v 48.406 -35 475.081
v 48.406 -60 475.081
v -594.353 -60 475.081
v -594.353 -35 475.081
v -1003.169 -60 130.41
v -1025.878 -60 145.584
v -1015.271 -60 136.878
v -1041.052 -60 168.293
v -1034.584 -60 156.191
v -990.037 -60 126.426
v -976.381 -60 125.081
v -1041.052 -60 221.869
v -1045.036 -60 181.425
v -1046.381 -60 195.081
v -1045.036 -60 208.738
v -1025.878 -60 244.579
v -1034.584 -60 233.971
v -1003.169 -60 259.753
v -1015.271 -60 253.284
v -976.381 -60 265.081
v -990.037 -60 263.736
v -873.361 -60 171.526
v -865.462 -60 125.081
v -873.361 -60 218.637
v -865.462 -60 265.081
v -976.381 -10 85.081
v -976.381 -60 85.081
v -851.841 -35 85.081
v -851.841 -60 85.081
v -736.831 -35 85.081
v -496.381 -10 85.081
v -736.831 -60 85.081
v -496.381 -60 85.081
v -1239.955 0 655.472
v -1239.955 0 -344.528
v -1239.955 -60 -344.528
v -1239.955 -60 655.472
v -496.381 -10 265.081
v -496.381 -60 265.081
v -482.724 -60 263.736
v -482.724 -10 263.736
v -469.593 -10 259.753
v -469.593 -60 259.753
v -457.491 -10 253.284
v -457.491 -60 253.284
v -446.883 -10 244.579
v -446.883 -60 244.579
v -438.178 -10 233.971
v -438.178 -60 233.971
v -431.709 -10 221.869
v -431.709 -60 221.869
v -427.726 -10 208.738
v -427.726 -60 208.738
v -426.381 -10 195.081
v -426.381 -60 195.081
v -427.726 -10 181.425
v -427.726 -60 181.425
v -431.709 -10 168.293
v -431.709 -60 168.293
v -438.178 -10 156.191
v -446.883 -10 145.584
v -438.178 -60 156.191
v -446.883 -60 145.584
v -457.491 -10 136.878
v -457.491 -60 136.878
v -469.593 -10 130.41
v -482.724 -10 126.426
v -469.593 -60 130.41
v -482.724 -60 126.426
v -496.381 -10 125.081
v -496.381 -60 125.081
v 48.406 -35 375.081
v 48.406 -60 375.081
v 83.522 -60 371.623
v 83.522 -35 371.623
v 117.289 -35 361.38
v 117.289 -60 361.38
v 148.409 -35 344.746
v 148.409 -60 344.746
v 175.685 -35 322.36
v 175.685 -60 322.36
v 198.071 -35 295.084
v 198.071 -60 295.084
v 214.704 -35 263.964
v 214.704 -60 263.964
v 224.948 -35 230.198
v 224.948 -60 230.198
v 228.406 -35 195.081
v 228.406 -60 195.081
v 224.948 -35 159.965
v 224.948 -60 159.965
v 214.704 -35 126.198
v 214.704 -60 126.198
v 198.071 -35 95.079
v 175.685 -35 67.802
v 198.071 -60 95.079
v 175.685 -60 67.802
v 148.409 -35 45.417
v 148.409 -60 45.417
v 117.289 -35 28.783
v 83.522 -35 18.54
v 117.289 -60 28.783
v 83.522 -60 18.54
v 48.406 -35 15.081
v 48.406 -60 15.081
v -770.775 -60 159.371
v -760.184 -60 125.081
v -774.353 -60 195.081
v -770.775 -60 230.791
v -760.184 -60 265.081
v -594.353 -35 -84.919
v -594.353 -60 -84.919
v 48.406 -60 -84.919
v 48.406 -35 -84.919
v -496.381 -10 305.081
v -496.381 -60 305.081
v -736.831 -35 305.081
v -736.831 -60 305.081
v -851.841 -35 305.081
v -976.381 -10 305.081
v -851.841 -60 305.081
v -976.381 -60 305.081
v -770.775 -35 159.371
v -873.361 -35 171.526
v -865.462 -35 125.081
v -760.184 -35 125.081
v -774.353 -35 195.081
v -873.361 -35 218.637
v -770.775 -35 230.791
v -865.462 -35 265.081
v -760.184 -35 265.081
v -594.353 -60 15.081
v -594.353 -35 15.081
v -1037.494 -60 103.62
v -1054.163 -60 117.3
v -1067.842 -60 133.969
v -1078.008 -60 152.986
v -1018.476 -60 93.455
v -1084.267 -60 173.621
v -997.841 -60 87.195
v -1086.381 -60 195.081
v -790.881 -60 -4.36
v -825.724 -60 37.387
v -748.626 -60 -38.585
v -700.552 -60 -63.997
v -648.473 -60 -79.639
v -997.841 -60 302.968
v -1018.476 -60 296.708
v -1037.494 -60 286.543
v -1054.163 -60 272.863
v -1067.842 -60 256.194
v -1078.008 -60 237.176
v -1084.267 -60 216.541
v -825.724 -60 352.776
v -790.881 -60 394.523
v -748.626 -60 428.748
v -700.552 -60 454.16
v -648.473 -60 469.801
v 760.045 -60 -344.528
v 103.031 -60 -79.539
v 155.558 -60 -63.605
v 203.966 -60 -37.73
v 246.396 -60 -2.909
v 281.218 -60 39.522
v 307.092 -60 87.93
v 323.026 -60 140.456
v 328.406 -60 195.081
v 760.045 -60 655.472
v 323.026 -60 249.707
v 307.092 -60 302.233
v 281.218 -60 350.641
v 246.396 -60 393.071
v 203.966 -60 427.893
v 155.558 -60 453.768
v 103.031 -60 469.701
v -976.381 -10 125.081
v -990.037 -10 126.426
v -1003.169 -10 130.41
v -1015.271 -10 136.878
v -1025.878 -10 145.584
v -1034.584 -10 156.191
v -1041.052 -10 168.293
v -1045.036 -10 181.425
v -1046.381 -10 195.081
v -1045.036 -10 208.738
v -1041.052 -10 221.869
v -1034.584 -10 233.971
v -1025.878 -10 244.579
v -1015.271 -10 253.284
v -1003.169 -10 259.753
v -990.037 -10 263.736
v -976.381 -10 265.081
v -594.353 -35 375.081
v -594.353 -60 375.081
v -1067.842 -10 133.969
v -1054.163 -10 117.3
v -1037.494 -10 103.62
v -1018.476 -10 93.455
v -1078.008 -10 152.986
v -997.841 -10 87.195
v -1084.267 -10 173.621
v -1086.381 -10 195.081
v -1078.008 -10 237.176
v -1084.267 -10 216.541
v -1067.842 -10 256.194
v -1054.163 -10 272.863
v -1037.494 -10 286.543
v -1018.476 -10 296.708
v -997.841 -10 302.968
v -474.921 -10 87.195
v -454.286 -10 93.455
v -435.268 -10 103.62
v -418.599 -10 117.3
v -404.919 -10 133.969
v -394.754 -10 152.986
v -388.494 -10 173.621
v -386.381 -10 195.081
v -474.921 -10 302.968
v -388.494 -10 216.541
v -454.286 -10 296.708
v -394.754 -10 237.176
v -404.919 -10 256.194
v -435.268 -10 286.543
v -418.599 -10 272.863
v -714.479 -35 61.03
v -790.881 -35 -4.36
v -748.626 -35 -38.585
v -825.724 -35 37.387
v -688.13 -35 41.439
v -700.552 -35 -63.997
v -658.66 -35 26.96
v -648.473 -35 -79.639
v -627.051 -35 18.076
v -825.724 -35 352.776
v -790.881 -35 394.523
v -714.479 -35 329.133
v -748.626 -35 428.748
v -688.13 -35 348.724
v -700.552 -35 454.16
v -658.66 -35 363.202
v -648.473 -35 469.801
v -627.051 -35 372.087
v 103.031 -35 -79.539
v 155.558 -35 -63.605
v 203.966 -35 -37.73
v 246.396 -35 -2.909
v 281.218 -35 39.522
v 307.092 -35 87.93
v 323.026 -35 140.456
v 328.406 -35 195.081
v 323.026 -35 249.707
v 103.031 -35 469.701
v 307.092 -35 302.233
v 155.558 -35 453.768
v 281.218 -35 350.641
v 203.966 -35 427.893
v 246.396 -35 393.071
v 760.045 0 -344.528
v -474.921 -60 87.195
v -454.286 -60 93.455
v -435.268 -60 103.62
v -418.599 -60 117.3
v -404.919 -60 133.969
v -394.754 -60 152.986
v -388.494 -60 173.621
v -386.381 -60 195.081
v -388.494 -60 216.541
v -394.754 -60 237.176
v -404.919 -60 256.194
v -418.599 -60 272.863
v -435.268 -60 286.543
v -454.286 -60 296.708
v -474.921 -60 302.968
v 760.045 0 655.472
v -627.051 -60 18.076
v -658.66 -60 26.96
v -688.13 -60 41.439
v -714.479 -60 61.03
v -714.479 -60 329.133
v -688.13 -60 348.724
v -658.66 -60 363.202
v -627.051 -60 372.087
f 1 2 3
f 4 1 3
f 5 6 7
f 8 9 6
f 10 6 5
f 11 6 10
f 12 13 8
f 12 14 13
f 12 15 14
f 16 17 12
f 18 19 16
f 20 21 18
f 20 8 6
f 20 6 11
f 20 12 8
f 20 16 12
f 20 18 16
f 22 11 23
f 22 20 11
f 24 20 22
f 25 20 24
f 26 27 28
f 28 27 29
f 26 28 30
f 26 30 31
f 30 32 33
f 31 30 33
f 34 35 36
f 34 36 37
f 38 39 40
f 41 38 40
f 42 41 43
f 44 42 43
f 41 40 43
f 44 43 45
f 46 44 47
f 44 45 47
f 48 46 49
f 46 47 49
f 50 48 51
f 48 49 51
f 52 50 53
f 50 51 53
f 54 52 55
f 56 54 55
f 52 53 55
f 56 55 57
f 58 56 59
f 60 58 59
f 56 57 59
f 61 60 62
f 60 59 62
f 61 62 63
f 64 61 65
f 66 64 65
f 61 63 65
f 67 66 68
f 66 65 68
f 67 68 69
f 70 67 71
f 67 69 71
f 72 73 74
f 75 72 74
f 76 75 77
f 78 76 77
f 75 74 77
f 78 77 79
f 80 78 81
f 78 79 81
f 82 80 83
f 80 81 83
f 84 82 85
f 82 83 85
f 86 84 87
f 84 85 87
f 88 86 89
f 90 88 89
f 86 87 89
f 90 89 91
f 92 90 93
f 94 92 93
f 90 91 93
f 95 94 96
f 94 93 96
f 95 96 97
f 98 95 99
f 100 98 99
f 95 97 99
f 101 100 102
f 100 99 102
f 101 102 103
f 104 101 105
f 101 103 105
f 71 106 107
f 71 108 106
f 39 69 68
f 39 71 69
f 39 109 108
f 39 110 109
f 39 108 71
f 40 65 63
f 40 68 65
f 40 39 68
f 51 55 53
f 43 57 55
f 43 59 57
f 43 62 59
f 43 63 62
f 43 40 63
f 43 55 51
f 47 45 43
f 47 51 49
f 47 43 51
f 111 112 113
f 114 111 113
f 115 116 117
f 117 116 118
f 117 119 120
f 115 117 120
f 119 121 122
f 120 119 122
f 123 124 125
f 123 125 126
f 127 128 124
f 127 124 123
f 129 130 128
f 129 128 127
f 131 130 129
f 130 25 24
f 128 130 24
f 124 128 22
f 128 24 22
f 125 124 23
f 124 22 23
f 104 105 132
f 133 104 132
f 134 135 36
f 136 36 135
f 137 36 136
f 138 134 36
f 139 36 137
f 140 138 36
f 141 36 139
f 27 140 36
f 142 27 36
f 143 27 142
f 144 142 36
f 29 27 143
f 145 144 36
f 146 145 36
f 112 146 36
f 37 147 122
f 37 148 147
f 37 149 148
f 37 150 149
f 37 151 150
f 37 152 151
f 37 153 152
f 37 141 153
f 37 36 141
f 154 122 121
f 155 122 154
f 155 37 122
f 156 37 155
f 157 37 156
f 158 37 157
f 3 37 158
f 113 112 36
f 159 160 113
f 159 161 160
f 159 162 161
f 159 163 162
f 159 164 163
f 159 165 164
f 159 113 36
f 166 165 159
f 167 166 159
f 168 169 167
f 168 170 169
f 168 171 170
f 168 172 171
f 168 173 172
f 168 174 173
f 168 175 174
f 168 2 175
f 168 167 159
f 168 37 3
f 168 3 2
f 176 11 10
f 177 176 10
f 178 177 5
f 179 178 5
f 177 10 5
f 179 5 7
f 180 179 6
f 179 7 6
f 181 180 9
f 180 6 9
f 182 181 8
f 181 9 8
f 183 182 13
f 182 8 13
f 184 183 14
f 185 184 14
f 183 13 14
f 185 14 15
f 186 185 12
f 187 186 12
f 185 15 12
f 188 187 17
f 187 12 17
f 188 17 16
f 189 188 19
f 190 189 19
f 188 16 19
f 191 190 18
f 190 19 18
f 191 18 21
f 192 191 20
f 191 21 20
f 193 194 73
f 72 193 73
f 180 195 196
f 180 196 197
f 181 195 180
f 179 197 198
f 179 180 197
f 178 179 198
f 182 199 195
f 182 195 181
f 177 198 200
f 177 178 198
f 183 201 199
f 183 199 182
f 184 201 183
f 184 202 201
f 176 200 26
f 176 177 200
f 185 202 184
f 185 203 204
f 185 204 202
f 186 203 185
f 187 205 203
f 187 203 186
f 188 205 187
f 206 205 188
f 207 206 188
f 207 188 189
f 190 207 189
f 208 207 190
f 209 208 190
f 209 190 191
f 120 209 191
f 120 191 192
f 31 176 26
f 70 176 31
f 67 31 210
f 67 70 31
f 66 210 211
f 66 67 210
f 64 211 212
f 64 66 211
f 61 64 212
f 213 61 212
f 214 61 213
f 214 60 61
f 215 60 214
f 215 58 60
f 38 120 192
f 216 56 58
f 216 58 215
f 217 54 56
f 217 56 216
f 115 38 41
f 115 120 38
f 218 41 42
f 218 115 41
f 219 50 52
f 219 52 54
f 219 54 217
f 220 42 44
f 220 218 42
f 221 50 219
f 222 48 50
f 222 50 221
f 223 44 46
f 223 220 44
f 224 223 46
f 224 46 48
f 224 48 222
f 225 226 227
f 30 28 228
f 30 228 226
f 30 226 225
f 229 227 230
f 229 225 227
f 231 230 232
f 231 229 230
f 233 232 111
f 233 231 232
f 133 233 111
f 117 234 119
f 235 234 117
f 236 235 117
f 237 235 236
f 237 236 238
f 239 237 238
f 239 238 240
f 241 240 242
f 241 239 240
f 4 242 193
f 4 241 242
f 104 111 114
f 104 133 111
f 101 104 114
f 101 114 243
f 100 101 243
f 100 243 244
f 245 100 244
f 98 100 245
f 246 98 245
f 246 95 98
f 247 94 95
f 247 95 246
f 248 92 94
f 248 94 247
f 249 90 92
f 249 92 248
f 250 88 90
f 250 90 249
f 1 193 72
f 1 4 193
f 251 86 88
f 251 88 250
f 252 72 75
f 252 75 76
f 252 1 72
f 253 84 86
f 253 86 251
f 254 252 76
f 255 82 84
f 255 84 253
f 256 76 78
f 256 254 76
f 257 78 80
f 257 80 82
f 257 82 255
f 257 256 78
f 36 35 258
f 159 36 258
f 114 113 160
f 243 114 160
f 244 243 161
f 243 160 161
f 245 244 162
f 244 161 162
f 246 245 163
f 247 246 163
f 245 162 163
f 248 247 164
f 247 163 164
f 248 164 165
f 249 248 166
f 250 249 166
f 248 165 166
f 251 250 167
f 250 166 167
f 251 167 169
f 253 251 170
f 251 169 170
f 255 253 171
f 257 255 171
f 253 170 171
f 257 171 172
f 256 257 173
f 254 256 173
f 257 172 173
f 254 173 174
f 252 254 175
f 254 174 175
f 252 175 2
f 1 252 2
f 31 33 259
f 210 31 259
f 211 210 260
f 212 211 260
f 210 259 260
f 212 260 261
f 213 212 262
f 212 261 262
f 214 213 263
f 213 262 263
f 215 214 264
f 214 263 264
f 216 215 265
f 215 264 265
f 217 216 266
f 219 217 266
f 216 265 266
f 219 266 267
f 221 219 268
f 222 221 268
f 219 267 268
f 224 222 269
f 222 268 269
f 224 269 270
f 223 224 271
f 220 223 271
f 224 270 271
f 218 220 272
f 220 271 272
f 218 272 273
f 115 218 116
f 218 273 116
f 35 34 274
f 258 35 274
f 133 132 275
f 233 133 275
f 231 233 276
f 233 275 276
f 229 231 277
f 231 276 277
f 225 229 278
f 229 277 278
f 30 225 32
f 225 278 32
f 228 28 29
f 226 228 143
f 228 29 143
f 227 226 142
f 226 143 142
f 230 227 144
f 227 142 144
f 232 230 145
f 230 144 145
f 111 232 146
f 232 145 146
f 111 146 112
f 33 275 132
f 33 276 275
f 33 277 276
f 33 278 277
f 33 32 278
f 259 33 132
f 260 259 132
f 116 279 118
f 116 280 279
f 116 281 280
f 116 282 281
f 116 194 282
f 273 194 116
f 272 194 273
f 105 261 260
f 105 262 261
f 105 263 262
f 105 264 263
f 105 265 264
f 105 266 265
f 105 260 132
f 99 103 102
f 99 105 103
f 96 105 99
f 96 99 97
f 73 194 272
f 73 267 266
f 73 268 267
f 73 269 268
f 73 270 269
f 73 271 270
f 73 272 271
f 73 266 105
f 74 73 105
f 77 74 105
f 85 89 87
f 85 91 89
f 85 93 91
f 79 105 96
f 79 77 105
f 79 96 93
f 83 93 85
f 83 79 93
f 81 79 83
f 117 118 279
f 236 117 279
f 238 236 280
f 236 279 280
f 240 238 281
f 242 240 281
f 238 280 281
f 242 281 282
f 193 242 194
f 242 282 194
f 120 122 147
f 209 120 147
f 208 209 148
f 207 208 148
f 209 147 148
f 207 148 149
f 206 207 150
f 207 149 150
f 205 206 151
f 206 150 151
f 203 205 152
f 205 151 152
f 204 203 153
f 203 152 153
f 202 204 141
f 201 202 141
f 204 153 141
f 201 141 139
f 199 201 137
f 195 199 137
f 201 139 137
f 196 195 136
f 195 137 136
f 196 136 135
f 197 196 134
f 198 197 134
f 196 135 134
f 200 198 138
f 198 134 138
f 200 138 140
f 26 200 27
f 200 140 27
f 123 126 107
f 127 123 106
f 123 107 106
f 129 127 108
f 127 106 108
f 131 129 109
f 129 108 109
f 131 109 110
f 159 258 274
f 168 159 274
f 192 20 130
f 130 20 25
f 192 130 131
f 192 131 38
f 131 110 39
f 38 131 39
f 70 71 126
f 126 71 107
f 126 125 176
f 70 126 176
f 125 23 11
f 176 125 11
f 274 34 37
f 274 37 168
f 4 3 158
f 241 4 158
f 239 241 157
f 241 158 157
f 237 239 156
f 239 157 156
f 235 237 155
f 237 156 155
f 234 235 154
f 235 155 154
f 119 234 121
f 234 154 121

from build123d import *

# Parameters (mm, degrees)
F0_W     = 2000
F0_H     = 1000
F1_DEPTH = 60
F3_DEPTH = 50
F5_DEPTH = 25


with BuildPart() as f1:
    # F0 (on Front) → F1 (new body)
    with BuildSketch(Plane.XZ):
        with Locations((-239.9550452828, 155.4724135878)):
            Rectangle(F0_W, F0_H)
    extrude(amount=F1_DEPTH)

    # F2 (on face) → F3 (cut)
    with BuildSketch(Plane.XZ.offset(60)):
        with BuildLine():
            Line((-496.3808069078, 305.0812527983), (-976.3808069078, 305.0812527983))
            ThreePointArc((-976.3808069078, 305.0812527983), (-1086.3808069078, 195.0812527983), (-976.3808069078, 85.0812527983))
            Line((-976.3808069078, 85.0812527983), (-496.3808069078, 85.0812527983))
            ThreePointArc((-496.3808069078, 85.0812527983), (-386.3808069078, 195.0812527983), (-496.3808069078, 305.0812527983))
        make_face()
        with BuildLine():
            ThreePointArc((-976.3808069078, 125.0812527983), (-1046.3808069078, 195.0812527983), (-976.3808069078, 265.0812527983))
            Line((-976.3808069078, 265.0812527983), (-496.3808069078, 265.0812527983))
            ThreePointArc((-496.3808069078, 265.0812527983), (-426.3808069078, 195.0812527983), (-496.3808069078, 125.0812527983))
            Line((-496.3808069078, 125.0812527983), (-976.3808069078, 125.0812527983))
        make_face(mode=Mode.SUBTRACT)
    extrude(amount=-F3_DEPTH, mode=Mode.SUBTRACT)

    # F4 (on face) → F5 (cut)
    with BuildSketch(Plane.XZ.offset(60)):
        with BuildLine():
            ThreePointArc((-736.8312674929, 305.0812527983), (-673.7257383371, 356.6361970123), (-594.3531990051, 375.0812527983))
            Line((-594.3531990051, 375.0812527983), (48.4061799943, 375.0812527983))
            ThreePointArc((48.4061799943, 375.0812527983), (228.4061799943, 195.0812527983), (48.4061799943, 15.0812527983))
            Line((48.4061799943, 15.0812527983), (-594.3531990051, 15.0812527983))
            ThreePointArc((-594.3531990051, 15.0812527983), (-673.7257383371, 33.5263085842), (-736.8312674929, 85.0812527983))
            Line((-736.8312674929, 85.0812527983), (-851.8410627968, 85.0812527983))
            ThreePointArc((-851.8410627968, 85.0812527983), (-748.6256852105, -38.5851761127), (-594.3531990051, -84.9187472017))
            Line((-594.3531990051, -84.9187472017), (48.4061799943, -84.9187472017))
            ThreePointArc((48.4061799943, -84.9187472017), (328.4061799943, 195.0812527983), (48.4061799943, 475.0812527983))
            Line((48.4061799943, 475.0812527983), (-594.3531990051, 475.0812527983))
            ThreePointArc((-594.3531990051, 475.0812527983), (-748.6256852105, 428.7476817092), (-851.8410627968, 305.0812527983))
            Line((-851.8410627968, 305.0812527983), (-736.8312674929, 305.0812527983))
        make_face()
        with BuildLine():
            ThreePointArc((-736.8312674929, 85.0812527983), (-774.3531990051, 195.0812527983), (-736.8312674929, 305.0812527983))
            Line((-736.8312674929, 305.0812527983), (-851.8410627968, 305.0812527983))
            ThreePointArc((-851.8410627968, 305.0812527983), (-874.3531990051, 195.0812527983), (-851.8410627968, 85.0812527983))
            Line((-851.8410627968, 85.0812527983), (-736.8312674929, 85.0812527983))
        make_face()
    extrude(amount=-F5_DEPTH, mode=Mode.SUBTRACT)


solid = f1.part
